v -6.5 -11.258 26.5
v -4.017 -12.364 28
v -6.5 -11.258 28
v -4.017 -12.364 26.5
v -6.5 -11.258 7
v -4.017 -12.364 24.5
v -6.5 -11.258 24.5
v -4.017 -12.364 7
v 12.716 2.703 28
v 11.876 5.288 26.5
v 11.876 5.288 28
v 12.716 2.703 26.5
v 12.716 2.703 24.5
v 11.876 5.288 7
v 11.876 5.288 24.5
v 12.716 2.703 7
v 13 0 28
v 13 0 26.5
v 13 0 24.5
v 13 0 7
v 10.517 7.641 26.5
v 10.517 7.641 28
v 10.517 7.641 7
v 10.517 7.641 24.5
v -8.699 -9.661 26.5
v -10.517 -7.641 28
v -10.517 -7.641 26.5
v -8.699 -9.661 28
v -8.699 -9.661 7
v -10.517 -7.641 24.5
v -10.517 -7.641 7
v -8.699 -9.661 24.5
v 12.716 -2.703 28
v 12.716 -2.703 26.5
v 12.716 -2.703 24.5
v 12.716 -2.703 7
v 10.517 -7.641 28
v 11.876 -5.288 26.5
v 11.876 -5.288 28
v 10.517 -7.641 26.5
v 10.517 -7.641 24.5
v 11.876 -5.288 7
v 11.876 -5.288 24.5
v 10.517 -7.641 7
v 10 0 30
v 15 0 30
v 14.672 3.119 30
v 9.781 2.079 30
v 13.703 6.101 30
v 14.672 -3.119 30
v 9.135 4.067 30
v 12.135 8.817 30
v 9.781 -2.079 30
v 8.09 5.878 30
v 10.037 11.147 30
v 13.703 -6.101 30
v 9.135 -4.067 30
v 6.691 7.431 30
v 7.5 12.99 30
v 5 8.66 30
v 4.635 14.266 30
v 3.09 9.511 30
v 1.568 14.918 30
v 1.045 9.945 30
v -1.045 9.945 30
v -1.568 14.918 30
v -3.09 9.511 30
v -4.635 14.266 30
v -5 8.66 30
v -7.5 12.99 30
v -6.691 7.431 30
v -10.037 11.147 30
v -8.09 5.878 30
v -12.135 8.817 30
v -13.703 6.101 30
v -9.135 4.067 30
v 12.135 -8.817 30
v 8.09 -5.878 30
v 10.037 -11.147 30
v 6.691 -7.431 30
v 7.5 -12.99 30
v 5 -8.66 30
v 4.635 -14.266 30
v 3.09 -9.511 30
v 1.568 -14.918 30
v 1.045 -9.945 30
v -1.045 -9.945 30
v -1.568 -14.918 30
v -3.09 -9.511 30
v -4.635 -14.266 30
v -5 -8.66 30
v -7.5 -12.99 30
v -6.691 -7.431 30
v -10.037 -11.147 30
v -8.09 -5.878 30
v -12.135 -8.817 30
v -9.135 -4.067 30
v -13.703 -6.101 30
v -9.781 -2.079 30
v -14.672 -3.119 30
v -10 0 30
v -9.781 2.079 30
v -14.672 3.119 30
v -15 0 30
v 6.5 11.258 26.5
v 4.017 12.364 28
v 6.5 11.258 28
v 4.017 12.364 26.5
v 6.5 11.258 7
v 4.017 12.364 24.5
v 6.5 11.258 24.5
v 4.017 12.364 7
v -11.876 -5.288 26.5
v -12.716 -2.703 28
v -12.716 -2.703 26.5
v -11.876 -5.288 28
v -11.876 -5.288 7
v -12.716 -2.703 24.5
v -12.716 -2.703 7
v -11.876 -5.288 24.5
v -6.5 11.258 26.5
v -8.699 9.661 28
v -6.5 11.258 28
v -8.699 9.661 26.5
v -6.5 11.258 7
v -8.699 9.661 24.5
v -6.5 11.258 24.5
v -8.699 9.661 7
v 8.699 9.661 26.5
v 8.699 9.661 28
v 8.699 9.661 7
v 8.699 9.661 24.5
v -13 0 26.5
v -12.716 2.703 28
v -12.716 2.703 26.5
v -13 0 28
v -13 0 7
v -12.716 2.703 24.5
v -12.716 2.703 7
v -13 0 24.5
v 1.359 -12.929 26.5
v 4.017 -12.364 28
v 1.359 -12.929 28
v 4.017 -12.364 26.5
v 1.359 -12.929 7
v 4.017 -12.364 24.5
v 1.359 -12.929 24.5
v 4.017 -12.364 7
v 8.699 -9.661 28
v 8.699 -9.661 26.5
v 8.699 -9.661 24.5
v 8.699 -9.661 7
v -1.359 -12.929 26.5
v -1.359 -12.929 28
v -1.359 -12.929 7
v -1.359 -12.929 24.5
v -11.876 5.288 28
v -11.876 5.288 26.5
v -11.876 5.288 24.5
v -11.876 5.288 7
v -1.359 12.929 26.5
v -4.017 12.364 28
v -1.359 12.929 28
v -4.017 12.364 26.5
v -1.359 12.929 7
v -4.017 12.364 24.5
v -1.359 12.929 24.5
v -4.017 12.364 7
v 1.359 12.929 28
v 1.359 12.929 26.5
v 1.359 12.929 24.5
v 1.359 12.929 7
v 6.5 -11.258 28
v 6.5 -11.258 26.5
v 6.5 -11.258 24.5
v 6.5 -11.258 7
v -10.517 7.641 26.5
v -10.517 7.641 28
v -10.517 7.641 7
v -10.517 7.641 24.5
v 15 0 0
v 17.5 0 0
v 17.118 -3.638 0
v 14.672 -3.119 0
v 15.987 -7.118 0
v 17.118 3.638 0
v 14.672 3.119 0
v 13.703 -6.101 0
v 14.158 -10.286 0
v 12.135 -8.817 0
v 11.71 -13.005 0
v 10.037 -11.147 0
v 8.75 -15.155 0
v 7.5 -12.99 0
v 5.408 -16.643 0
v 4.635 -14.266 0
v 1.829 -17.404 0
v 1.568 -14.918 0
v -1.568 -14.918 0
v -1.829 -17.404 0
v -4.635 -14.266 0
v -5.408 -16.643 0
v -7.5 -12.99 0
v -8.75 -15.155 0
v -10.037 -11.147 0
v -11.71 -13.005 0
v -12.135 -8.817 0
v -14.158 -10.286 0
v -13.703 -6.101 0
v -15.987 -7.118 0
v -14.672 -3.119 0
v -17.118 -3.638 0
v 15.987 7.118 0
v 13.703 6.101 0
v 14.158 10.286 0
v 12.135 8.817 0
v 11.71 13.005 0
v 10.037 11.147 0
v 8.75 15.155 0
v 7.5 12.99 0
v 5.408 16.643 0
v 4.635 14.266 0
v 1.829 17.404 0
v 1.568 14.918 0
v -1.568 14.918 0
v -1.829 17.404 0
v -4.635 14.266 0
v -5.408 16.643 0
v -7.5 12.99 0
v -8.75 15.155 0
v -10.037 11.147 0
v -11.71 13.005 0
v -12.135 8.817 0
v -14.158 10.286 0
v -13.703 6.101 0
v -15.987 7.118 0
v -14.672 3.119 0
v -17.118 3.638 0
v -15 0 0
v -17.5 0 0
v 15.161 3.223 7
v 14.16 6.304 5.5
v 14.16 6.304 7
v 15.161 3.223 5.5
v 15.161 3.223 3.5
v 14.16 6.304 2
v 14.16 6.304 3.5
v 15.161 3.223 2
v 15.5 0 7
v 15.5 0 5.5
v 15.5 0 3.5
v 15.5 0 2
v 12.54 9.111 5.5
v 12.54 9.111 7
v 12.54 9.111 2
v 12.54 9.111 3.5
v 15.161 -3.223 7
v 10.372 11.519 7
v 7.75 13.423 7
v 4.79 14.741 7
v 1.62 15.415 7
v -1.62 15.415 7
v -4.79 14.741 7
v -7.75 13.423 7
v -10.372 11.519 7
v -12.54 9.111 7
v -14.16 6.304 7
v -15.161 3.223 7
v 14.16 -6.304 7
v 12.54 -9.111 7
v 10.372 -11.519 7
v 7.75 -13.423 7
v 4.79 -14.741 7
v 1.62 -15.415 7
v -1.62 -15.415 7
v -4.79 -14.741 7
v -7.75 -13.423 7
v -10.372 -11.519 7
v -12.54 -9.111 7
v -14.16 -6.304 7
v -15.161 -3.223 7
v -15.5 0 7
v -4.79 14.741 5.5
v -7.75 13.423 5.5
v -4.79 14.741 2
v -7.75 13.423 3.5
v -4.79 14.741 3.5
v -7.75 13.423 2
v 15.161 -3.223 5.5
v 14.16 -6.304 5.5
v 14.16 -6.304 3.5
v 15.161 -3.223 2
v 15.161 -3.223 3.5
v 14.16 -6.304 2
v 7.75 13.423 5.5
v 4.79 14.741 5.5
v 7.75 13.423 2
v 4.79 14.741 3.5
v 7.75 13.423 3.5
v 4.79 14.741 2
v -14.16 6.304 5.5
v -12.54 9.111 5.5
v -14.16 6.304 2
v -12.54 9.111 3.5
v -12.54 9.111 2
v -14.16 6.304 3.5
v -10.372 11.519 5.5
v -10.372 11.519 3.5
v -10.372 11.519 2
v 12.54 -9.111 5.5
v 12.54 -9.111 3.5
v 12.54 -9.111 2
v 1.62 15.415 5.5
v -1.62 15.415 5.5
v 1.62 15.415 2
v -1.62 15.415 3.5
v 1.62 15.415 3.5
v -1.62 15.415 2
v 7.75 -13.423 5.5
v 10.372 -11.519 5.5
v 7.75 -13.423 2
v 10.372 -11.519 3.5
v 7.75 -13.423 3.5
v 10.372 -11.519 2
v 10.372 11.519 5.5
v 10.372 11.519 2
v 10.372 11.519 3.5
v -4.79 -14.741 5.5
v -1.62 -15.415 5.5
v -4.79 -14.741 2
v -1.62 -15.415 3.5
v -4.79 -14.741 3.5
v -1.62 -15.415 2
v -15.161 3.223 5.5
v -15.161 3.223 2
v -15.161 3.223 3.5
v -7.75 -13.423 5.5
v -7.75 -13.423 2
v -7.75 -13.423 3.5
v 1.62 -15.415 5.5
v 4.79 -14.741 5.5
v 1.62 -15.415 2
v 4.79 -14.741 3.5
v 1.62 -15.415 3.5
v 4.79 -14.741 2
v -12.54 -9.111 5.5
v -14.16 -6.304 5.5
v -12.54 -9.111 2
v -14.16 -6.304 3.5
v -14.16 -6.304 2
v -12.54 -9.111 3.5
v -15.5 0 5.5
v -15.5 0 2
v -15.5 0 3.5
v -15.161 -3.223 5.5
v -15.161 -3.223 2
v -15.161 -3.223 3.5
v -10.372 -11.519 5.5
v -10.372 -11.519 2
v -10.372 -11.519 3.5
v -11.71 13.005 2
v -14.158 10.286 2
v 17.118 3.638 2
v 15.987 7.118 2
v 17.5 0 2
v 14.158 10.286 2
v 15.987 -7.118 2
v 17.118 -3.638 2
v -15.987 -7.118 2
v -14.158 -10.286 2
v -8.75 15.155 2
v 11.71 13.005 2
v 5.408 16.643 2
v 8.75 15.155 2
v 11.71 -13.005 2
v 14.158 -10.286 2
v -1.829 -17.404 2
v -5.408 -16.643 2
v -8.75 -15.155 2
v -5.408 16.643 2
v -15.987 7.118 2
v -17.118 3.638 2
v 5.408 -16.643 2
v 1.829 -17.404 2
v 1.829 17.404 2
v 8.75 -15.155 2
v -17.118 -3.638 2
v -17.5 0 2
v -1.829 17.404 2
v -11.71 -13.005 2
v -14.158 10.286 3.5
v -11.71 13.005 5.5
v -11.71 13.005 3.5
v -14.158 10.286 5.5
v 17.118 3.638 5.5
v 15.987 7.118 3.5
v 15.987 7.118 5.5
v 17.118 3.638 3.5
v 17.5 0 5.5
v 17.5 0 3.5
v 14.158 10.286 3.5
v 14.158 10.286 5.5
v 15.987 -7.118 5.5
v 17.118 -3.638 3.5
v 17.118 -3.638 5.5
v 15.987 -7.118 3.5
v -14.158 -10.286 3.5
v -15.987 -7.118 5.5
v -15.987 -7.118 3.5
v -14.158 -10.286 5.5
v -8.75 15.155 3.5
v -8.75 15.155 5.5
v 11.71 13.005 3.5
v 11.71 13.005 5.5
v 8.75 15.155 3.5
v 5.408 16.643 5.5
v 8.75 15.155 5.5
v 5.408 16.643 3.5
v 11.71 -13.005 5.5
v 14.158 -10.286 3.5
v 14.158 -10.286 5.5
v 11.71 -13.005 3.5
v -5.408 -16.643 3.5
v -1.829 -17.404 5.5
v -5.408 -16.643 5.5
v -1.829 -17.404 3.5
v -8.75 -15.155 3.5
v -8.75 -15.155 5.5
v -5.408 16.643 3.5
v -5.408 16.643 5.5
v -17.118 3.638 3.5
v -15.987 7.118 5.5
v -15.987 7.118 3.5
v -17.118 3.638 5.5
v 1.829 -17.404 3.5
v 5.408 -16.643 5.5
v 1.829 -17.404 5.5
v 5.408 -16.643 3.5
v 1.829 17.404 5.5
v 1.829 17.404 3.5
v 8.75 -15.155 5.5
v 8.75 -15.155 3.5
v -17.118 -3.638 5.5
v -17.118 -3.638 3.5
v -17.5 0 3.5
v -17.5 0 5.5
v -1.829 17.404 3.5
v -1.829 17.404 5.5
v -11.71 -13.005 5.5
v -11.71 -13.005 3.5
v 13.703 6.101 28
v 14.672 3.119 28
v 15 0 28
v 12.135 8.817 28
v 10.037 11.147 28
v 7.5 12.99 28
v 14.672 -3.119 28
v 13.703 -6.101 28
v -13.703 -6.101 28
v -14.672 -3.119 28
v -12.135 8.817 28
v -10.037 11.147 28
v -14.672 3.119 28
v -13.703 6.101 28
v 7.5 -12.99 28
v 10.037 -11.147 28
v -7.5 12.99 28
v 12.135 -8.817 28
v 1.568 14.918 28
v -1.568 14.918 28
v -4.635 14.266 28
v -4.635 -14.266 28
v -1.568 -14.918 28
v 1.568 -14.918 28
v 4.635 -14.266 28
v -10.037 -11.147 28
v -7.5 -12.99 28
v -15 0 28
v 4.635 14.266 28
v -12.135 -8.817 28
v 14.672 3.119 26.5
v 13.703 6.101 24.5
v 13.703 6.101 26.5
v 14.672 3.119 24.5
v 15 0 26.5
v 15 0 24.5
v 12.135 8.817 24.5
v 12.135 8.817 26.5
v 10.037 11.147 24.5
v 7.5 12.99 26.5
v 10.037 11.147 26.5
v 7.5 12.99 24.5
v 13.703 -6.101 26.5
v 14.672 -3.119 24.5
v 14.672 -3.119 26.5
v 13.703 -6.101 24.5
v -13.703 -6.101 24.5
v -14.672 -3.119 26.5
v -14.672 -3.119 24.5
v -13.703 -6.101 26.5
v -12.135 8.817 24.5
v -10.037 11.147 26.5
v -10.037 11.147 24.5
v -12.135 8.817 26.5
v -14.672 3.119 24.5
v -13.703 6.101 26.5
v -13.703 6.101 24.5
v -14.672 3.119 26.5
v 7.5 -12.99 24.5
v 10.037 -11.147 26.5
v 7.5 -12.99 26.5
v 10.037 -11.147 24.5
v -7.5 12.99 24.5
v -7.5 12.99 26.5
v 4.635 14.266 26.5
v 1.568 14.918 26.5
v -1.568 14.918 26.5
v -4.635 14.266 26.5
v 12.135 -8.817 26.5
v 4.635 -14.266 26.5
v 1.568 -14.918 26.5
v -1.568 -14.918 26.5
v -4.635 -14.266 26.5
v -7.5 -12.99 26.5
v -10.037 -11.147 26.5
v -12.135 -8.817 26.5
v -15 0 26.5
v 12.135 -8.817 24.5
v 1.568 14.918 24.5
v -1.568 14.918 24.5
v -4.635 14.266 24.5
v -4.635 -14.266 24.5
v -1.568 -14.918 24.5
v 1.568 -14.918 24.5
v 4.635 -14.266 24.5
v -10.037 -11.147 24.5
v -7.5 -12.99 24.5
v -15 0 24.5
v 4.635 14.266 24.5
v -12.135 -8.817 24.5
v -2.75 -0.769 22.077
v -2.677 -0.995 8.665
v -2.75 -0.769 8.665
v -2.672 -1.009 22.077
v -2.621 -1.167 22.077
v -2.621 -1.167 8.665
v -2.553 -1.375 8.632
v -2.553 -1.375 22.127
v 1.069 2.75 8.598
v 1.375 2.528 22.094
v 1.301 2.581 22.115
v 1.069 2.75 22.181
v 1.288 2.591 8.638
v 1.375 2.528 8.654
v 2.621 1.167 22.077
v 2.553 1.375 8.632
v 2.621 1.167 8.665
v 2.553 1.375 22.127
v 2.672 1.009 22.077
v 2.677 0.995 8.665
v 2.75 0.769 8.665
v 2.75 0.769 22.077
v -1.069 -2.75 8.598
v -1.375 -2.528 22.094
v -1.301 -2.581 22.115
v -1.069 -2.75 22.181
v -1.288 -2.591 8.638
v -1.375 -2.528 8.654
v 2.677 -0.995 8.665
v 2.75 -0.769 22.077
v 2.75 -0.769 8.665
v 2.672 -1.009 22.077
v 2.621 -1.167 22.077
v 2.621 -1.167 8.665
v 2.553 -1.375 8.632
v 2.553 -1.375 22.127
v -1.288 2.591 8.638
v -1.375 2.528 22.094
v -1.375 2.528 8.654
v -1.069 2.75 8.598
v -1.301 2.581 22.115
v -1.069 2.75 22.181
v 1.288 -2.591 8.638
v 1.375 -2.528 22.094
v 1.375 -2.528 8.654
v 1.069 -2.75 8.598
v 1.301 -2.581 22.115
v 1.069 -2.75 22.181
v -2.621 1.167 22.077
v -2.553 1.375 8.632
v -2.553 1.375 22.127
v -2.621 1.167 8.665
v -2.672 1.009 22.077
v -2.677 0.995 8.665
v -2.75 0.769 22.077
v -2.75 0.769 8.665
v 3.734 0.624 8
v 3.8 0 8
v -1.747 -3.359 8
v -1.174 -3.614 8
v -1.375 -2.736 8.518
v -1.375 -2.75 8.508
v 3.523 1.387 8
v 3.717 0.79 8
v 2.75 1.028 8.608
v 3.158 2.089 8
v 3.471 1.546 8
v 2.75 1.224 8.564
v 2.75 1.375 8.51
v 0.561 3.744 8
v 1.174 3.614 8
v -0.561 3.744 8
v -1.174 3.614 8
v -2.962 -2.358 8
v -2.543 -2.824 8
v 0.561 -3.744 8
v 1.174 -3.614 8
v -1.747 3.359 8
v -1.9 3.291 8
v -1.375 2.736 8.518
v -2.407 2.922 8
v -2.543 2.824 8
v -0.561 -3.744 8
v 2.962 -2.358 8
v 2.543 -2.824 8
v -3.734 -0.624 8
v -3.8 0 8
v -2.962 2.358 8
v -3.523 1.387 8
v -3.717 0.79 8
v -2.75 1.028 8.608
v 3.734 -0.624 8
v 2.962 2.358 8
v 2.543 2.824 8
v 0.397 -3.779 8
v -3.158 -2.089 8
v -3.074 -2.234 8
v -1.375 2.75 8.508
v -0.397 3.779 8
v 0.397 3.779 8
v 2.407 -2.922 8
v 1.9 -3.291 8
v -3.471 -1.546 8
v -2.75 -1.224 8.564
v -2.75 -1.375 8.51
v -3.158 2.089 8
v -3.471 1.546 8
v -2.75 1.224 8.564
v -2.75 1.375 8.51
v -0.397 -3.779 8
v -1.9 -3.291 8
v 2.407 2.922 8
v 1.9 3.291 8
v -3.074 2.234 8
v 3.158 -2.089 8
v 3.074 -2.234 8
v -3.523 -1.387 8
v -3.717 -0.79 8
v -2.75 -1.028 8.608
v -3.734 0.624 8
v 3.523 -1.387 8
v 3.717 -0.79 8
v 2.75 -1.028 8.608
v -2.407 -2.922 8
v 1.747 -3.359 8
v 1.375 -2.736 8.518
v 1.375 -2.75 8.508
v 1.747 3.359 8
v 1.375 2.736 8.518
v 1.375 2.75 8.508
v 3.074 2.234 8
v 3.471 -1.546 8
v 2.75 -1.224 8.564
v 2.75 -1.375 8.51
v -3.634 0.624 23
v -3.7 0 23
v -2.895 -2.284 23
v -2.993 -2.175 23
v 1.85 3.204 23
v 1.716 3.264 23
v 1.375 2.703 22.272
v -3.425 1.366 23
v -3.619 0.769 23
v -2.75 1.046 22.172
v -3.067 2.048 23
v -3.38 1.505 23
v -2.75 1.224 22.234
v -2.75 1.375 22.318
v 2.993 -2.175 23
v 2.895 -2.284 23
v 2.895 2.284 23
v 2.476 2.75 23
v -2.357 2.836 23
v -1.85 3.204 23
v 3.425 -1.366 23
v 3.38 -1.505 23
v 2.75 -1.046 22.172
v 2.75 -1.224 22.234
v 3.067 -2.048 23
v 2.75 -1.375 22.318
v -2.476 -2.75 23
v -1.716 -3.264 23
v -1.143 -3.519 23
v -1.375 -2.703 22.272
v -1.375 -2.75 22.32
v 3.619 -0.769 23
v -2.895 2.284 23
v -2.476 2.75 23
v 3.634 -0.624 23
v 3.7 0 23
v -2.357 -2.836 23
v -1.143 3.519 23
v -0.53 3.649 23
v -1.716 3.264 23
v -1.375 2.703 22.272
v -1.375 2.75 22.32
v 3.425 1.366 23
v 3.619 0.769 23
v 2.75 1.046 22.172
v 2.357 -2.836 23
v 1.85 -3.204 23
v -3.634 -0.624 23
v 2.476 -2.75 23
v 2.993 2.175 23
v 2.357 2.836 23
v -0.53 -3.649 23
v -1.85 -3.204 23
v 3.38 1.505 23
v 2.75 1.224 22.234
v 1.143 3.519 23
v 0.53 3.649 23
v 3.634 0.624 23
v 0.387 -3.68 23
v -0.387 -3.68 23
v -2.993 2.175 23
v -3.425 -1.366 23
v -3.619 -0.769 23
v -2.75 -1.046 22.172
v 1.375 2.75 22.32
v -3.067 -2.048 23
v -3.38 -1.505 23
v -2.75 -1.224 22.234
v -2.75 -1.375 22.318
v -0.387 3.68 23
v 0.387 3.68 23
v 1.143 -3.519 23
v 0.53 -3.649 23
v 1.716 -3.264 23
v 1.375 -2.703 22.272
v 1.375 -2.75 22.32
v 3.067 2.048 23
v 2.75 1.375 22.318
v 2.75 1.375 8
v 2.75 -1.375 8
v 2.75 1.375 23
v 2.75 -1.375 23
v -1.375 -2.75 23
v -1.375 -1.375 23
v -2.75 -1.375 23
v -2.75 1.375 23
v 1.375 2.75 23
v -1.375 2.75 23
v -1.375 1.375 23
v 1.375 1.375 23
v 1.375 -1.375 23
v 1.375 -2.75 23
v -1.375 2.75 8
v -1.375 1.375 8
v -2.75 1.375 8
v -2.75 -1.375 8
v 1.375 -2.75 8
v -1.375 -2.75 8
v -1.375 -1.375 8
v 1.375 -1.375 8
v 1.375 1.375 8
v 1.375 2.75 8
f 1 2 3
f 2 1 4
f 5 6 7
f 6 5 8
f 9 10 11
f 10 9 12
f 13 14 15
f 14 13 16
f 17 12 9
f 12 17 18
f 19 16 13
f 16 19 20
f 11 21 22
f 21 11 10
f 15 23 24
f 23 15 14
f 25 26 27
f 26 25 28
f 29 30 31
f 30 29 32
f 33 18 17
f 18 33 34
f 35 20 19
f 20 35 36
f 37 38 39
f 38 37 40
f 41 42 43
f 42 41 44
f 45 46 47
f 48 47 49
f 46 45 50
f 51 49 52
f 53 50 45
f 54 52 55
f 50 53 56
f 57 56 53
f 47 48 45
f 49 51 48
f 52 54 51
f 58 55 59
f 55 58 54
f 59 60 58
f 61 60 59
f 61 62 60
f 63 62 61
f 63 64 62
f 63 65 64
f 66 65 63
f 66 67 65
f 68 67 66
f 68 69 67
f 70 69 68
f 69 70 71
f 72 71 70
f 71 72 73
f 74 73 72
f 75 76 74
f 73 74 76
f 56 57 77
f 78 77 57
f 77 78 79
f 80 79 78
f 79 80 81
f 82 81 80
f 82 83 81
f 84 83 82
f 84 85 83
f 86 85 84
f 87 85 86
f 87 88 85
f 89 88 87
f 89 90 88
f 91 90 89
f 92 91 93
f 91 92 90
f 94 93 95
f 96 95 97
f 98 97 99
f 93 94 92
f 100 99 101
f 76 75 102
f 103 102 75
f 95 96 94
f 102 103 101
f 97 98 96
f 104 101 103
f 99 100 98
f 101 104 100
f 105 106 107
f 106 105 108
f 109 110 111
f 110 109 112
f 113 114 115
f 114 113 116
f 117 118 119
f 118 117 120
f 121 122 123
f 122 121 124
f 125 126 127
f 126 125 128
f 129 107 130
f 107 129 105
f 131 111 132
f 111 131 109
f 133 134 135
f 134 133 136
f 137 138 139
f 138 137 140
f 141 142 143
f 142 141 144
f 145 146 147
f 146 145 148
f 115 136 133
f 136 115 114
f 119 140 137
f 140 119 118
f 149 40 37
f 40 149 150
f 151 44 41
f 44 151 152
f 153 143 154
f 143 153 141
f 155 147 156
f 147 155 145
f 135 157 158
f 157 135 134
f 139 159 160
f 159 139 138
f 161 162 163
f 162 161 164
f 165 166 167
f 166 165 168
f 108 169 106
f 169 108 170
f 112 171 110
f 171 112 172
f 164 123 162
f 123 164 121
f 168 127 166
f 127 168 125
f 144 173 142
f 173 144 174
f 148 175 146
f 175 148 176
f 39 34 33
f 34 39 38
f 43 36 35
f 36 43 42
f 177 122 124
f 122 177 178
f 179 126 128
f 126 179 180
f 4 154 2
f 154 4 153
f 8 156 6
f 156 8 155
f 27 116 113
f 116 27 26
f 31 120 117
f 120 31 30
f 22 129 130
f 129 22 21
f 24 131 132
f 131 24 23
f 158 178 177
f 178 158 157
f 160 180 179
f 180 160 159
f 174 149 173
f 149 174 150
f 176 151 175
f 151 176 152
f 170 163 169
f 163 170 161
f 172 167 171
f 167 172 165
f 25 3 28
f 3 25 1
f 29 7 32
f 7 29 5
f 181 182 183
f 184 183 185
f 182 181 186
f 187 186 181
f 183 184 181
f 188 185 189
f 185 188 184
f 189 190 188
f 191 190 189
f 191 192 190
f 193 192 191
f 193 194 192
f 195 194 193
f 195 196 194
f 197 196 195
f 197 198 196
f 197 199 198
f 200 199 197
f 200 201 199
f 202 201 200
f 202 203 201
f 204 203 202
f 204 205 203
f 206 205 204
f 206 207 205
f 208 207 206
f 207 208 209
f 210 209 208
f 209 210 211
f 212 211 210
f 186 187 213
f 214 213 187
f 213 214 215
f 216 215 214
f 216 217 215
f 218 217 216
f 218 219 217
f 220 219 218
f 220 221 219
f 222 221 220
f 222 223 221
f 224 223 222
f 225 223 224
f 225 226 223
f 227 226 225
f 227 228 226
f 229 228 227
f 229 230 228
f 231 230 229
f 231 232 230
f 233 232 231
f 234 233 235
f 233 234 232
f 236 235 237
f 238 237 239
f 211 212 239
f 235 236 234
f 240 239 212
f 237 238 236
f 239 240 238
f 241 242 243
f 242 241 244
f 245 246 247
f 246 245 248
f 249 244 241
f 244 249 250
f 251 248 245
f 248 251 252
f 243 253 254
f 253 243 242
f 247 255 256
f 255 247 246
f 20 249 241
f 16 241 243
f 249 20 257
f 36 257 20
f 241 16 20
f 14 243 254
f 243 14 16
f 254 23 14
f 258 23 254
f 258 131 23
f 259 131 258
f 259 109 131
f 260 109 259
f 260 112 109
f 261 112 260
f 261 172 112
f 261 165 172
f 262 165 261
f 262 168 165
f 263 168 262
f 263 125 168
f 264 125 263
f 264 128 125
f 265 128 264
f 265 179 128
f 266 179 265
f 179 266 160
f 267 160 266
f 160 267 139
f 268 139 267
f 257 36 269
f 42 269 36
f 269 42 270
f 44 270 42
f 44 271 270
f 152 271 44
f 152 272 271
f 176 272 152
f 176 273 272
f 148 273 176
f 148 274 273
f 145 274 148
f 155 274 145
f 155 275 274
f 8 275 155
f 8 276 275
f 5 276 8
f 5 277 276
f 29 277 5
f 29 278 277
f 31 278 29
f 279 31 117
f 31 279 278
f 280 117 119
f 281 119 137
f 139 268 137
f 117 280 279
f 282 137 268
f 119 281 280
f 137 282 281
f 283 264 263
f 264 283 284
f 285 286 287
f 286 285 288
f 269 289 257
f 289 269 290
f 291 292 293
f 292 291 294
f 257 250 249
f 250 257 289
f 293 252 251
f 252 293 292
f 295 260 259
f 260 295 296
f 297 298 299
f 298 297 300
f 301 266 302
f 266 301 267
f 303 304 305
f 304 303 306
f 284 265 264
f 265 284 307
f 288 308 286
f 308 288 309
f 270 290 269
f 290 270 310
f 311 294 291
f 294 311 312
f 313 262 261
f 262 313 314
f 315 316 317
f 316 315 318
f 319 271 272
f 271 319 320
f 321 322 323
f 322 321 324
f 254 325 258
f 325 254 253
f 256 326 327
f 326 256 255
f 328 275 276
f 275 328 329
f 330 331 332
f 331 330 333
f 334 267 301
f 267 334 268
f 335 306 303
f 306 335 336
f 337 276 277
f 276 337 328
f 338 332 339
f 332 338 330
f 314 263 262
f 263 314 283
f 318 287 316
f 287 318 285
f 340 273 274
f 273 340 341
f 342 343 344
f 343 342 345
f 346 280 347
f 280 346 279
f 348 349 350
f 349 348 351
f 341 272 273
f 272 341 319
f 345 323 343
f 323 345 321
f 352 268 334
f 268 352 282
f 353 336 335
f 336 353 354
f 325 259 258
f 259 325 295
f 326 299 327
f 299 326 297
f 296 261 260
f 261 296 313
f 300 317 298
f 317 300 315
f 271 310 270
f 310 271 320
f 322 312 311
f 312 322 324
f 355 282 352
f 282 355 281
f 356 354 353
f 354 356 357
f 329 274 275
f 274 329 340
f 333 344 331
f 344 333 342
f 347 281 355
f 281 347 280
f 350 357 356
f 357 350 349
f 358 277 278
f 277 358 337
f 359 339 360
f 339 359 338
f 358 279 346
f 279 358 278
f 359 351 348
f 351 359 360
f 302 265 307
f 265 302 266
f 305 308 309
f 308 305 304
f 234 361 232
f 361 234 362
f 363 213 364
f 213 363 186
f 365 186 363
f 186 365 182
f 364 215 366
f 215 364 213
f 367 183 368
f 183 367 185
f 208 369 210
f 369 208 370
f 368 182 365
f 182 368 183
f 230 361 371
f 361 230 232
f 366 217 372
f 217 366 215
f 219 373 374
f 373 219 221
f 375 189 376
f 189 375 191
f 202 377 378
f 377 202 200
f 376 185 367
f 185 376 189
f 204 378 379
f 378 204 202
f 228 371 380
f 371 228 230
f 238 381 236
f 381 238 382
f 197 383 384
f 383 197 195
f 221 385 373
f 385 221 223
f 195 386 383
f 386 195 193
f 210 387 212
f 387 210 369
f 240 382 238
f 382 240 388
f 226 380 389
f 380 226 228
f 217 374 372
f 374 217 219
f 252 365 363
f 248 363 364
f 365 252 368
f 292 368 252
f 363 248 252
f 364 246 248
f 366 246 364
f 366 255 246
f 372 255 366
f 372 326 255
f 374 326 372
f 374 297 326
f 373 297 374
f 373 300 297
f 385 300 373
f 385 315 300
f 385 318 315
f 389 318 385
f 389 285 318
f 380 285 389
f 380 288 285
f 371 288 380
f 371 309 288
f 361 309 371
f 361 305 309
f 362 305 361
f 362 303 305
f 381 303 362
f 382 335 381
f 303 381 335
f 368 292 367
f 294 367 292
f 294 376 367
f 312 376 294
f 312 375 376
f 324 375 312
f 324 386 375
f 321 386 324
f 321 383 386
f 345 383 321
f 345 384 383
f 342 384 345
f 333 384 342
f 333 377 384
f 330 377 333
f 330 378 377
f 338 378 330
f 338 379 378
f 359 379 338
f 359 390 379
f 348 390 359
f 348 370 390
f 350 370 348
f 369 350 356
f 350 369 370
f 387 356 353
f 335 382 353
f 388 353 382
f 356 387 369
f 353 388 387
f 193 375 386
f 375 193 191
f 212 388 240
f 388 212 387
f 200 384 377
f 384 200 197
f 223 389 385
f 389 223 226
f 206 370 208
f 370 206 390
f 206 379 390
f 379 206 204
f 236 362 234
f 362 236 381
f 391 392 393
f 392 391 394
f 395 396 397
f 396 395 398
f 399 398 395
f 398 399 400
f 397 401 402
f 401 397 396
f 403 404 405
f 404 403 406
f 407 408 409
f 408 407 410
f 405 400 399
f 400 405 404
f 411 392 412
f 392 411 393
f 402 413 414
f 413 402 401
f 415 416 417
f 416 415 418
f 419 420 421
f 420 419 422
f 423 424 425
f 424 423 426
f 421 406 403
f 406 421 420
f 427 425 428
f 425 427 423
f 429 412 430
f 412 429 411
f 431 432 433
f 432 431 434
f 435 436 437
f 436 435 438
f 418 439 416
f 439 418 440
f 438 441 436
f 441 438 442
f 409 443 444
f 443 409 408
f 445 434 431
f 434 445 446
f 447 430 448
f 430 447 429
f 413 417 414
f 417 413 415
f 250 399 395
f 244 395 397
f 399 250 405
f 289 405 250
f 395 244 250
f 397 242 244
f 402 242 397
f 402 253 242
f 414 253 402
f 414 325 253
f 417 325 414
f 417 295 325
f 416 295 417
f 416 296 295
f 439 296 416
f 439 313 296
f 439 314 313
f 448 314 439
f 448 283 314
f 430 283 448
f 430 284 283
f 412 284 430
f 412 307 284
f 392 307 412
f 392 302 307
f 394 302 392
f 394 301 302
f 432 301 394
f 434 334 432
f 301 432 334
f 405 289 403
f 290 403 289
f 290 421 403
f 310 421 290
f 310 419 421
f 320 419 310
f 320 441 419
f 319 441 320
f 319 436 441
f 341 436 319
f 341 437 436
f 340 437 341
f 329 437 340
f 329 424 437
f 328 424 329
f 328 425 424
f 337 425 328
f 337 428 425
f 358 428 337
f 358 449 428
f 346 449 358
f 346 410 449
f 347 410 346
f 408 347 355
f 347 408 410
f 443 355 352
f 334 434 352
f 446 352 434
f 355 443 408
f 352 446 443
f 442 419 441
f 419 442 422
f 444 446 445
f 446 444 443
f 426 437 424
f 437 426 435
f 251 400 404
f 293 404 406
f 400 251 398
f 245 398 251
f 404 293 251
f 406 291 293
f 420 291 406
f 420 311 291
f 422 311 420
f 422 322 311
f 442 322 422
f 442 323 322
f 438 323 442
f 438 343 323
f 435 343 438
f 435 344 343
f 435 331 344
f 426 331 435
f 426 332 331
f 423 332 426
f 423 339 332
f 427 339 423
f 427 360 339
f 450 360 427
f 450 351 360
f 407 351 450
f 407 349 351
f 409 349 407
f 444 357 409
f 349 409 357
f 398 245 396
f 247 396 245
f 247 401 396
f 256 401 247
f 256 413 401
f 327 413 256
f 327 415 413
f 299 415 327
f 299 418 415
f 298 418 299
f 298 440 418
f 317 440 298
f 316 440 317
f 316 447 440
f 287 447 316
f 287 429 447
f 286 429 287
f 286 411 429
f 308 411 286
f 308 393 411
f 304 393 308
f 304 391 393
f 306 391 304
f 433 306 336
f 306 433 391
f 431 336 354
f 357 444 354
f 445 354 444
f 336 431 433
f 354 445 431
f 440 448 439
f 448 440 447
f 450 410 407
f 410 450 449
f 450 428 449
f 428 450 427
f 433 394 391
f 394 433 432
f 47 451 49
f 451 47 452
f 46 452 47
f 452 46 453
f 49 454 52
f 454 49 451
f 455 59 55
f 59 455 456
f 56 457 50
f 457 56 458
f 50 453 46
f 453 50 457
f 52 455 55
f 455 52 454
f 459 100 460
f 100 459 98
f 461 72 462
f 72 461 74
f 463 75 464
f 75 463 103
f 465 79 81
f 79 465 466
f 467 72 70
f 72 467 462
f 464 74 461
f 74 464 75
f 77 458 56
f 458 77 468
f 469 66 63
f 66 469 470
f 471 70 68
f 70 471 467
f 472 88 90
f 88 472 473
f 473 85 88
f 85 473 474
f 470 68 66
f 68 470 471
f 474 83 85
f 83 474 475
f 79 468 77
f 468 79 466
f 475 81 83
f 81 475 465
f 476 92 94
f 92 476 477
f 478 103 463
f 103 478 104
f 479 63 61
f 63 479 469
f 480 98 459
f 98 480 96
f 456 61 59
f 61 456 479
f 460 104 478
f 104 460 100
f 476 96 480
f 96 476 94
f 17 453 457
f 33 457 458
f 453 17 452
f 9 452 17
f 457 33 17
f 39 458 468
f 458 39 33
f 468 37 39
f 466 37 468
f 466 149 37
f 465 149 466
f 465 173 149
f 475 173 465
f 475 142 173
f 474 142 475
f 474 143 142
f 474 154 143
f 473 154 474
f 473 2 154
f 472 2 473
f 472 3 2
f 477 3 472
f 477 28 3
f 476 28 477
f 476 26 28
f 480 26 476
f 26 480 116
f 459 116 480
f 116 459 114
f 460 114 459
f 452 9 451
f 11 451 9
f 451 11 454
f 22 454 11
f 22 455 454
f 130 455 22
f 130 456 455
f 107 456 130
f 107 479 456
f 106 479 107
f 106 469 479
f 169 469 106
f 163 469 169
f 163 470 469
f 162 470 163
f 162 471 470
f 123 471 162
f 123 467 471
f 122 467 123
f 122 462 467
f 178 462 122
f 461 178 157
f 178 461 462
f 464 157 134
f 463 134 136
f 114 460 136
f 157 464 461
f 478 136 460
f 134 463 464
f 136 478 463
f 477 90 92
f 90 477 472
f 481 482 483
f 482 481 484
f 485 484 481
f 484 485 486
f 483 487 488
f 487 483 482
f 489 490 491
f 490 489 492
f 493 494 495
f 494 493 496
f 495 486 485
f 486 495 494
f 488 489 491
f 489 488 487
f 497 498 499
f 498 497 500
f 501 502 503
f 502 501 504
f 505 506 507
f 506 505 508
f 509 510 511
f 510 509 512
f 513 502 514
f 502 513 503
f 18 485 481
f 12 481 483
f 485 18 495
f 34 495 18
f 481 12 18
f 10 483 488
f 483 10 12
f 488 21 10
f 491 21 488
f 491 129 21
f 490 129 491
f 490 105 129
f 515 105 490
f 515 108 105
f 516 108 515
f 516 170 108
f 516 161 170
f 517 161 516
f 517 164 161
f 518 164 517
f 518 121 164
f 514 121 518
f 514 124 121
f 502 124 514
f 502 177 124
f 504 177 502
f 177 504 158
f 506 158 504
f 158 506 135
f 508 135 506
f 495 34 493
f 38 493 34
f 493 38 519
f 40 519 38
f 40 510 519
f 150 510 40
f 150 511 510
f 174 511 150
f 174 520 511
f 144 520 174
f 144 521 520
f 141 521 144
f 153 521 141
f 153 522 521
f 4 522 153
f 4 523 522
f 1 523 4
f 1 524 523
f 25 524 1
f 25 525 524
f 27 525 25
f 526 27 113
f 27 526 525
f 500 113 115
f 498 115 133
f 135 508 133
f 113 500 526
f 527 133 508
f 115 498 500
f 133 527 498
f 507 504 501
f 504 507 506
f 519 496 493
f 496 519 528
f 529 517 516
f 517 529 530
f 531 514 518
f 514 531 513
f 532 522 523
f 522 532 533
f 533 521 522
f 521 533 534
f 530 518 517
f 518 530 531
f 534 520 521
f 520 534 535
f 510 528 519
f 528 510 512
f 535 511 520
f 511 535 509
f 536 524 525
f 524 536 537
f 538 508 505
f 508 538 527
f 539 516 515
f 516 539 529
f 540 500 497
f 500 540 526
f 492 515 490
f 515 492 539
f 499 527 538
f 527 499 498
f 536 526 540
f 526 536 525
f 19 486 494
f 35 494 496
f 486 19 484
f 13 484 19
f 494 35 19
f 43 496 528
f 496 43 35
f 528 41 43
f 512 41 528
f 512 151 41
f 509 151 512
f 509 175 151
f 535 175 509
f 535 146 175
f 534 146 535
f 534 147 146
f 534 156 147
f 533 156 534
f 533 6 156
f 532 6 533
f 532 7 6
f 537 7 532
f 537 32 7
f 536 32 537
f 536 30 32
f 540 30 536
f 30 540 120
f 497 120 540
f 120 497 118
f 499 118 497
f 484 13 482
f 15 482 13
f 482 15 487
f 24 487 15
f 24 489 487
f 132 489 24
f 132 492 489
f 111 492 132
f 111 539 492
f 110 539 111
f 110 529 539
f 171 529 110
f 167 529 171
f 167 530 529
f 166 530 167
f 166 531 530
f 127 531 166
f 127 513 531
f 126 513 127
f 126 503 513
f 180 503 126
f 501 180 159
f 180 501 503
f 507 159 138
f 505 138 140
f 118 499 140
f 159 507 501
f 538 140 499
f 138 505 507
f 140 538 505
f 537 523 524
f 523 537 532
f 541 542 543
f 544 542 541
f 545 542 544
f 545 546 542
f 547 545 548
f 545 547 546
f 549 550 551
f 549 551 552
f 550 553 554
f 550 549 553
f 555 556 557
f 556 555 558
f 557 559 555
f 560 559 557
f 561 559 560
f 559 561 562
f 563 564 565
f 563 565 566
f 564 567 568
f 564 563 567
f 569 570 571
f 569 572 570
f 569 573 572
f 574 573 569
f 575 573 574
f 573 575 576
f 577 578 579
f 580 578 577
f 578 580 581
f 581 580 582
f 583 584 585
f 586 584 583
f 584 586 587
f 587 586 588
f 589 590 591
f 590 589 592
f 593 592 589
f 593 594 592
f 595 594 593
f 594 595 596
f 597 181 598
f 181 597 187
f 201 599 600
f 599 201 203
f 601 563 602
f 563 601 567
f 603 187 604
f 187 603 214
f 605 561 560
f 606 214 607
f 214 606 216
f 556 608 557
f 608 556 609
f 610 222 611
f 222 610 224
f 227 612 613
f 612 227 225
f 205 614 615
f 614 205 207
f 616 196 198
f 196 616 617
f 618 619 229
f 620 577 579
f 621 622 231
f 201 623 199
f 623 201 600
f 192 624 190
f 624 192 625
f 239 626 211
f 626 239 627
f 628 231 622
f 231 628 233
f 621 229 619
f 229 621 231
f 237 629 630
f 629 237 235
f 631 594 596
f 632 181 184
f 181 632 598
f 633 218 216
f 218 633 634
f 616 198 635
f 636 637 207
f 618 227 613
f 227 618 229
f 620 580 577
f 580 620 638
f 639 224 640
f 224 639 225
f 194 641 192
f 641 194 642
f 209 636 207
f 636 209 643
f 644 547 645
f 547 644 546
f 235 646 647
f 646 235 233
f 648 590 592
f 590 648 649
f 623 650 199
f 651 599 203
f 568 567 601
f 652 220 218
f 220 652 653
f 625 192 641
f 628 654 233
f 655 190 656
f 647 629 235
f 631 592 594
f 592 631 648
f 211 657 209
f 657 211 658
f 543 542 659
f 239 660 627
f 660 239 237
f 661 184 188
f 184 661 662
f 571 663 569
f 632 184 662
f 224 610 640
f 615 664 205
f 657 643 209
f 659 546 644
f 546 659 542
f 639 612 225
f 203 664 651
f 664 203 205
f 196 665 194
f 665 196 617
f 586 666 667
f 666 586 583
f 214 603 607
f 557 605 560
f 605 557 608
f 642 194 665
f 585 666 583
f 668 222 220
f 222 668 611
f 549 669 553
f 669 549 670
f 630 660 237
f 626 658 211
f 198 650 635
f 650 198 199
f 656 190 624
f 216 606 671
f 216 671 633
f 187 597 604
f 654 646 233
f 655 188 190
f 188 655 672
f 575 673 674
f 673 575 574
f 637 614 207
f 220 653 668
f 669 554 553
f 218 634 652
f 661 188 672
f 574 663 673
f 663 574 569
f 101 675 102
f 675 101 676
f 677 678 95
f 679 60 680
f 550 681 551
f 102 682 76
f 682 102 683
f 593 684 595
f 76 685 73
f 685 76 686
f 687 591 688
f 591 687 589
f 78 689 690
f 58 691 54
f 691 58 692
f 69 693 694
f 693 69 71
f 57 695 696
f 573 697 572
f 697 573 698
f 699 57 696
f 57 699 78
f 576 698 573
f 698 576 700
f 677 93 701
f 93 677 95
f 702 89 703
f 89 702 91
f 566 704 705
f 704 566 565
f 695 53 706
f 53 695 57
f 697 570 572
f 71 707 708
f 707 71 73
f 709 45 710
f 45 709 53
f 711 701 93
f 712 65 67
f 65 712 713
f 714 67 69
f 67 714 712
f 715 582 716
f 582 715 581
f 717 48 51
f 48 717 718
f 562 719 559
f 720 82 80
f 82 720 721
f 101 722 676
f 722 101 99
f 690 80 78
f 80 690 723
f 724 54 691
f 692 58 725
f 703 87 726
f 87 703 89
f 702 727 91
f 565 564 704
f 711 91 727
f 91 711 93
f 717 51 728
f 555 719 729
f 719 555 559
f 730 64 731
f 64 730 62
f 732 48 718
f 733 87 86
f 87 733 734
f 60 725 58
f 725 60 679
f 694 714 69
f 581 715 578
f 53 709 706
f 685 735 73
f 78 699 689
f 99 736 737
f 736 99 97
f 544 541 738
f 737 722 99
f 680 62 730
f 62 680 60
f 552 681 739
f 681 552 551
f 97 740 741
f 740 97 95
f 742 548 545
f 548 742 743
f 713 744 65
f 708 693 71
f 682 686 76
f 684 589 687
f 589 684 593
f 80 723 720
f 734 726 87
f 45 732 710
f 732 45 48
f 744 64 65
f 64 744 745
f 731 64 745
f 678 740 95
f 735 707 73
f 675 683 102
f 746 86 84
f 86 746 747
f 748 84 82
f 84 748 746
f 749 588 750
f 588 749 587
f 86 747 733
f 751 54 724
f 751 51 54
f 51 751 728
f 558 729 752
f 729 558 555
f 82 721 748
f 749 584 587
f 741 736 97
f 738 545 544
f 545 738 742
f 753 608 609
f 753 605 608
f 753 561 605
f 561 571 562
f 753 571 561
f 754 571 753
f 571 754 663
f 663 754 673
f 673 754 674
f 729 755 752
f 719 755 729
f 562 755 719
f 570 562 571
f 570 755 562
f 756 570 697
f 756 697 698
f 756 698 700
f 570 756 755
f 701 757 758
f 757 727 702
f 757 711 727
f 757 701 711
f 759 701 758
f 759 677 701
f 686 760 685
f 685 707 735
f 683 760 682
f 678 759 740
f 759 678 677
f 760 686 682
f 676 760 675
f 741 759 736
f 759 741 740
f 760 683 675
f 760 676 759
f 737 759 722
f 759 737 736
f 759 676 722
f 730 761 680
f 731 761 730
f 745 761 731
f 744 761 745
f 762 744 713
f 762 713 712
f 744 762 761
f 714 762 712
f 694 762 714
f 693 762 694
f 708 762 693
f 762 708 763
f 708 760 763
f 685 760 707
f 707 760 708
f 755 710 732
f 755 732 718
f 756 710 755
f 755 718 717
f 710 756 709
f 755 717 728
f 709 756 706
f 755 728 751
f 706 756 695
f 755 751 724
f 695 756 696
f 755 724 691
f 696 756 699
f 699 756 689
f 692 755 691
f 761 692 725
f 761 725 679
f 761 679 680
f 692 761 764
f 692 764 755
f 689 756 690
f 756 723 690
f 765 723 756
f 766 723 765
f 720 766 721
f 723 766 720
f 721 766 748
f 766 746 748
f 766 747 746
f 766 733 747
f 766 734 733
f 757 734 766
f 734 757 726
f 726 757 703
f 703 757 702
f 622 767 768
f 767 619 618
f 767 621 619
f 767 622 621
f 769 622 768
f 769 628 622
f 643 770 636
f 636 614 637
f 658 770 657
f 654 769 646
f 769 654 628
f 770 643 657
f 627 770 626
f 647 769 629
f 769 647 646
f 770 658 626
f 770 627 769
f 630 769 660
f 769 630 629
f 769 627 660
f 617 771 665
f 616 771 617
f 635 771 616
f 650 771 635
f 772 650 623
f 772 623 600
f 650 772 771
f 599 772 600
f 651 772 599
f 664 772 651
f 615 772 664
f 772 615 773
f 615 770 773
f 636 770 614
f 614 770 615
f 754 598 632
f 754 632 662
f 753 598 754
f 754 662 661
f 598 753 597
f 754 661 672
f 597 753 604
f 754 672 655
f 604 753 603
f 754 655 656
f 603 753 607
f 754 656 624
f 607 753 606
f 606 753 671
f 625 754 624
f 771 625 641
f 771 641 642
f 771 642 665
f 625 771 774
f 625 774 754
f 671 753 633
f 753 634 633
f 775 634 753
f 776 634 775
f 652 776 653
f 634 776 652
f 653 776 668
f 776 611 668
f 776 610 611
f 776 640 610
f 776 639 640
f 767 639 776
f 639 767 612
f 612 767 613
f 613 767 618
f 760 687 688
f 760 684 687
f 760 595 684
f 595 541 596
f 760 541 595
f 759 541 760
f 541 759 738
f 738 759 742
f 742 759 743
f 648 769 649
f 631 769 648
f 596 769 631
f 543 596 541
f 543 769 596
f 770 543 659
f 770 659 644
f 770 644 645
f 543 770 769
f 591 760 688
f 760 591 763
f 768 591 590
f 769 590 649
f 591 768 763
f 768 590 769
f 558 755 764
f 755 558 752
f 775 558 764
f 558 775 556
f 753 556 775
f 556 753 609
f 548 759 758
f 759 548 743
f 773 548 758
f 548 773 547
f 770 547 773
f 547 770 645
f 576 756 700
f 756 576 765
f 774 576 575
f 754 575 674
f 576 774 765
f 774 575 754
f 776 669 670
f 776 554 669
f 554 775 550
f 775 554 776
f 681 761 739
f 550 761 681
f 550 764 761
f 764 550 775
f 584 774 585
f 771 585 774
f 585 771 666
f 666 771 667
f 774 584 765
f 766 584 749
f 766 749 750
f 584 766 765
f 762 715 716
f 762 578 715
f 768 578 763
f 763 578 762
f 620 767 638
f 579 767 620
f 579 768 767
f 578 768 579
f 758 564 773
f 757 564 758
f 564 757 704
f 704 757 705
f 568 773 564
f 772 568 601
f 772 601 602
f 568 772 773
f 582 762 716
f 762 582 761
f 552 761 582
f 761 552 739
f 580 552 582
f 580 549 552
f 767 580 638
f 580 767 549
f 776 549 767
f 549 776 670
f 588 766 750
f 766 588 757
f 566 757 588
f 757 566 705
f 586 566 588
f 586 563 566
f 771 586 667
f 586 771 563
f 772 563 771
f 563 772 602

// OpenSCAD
hoogtegrip = 15;
gripoffset = 15.5;

module wiel()
    difference()
    {
        union()
            {
            cylinder(r=26/2,h=30);
            cylinder(r=31/2,h=7);        
            
            cylinder(r=35/2,h=2);    
            
            translate([0,0,3.5])
             cylinder(r=35/2,h=2);        
            
            translate([0,0,30-2])
             cylinder(r=30/2,h=2);    
            
            translate([0,0,30-2-1.5-2])
             cylinder(r=30/2,h=2);      
                
                
            }
        
        union()
            {
            cylinder(r=6/2,h=30);
            cylinder(10,15);   
               
            translate([0,0,30])
            rotate(a=[0,180,0])
            cylinder(10,10);     
            }
        
    }
    
module grip()
    
difference()
{
    union()
    {
    translate([0,0,gripoffset])    
    cube(size=[10,10,hoogtegrip],center=true);
    }    

    union()
    {
    //translate([(10-5.5)/2,10/2-5.5/2/2,0])    
    translate([0,0,gripoffset])
    cube(size=[5.5,5.5/2,hoogtegrip],center=true);
    
    //translate([10/2-5.5/2/2,(10-5.5)/2,0])    
    translate([0,0,gripoffset])
    cube(size=[5.5/2,5.5,hoogtegrip],center=true);    
    }    
}

wiel();
grip();
